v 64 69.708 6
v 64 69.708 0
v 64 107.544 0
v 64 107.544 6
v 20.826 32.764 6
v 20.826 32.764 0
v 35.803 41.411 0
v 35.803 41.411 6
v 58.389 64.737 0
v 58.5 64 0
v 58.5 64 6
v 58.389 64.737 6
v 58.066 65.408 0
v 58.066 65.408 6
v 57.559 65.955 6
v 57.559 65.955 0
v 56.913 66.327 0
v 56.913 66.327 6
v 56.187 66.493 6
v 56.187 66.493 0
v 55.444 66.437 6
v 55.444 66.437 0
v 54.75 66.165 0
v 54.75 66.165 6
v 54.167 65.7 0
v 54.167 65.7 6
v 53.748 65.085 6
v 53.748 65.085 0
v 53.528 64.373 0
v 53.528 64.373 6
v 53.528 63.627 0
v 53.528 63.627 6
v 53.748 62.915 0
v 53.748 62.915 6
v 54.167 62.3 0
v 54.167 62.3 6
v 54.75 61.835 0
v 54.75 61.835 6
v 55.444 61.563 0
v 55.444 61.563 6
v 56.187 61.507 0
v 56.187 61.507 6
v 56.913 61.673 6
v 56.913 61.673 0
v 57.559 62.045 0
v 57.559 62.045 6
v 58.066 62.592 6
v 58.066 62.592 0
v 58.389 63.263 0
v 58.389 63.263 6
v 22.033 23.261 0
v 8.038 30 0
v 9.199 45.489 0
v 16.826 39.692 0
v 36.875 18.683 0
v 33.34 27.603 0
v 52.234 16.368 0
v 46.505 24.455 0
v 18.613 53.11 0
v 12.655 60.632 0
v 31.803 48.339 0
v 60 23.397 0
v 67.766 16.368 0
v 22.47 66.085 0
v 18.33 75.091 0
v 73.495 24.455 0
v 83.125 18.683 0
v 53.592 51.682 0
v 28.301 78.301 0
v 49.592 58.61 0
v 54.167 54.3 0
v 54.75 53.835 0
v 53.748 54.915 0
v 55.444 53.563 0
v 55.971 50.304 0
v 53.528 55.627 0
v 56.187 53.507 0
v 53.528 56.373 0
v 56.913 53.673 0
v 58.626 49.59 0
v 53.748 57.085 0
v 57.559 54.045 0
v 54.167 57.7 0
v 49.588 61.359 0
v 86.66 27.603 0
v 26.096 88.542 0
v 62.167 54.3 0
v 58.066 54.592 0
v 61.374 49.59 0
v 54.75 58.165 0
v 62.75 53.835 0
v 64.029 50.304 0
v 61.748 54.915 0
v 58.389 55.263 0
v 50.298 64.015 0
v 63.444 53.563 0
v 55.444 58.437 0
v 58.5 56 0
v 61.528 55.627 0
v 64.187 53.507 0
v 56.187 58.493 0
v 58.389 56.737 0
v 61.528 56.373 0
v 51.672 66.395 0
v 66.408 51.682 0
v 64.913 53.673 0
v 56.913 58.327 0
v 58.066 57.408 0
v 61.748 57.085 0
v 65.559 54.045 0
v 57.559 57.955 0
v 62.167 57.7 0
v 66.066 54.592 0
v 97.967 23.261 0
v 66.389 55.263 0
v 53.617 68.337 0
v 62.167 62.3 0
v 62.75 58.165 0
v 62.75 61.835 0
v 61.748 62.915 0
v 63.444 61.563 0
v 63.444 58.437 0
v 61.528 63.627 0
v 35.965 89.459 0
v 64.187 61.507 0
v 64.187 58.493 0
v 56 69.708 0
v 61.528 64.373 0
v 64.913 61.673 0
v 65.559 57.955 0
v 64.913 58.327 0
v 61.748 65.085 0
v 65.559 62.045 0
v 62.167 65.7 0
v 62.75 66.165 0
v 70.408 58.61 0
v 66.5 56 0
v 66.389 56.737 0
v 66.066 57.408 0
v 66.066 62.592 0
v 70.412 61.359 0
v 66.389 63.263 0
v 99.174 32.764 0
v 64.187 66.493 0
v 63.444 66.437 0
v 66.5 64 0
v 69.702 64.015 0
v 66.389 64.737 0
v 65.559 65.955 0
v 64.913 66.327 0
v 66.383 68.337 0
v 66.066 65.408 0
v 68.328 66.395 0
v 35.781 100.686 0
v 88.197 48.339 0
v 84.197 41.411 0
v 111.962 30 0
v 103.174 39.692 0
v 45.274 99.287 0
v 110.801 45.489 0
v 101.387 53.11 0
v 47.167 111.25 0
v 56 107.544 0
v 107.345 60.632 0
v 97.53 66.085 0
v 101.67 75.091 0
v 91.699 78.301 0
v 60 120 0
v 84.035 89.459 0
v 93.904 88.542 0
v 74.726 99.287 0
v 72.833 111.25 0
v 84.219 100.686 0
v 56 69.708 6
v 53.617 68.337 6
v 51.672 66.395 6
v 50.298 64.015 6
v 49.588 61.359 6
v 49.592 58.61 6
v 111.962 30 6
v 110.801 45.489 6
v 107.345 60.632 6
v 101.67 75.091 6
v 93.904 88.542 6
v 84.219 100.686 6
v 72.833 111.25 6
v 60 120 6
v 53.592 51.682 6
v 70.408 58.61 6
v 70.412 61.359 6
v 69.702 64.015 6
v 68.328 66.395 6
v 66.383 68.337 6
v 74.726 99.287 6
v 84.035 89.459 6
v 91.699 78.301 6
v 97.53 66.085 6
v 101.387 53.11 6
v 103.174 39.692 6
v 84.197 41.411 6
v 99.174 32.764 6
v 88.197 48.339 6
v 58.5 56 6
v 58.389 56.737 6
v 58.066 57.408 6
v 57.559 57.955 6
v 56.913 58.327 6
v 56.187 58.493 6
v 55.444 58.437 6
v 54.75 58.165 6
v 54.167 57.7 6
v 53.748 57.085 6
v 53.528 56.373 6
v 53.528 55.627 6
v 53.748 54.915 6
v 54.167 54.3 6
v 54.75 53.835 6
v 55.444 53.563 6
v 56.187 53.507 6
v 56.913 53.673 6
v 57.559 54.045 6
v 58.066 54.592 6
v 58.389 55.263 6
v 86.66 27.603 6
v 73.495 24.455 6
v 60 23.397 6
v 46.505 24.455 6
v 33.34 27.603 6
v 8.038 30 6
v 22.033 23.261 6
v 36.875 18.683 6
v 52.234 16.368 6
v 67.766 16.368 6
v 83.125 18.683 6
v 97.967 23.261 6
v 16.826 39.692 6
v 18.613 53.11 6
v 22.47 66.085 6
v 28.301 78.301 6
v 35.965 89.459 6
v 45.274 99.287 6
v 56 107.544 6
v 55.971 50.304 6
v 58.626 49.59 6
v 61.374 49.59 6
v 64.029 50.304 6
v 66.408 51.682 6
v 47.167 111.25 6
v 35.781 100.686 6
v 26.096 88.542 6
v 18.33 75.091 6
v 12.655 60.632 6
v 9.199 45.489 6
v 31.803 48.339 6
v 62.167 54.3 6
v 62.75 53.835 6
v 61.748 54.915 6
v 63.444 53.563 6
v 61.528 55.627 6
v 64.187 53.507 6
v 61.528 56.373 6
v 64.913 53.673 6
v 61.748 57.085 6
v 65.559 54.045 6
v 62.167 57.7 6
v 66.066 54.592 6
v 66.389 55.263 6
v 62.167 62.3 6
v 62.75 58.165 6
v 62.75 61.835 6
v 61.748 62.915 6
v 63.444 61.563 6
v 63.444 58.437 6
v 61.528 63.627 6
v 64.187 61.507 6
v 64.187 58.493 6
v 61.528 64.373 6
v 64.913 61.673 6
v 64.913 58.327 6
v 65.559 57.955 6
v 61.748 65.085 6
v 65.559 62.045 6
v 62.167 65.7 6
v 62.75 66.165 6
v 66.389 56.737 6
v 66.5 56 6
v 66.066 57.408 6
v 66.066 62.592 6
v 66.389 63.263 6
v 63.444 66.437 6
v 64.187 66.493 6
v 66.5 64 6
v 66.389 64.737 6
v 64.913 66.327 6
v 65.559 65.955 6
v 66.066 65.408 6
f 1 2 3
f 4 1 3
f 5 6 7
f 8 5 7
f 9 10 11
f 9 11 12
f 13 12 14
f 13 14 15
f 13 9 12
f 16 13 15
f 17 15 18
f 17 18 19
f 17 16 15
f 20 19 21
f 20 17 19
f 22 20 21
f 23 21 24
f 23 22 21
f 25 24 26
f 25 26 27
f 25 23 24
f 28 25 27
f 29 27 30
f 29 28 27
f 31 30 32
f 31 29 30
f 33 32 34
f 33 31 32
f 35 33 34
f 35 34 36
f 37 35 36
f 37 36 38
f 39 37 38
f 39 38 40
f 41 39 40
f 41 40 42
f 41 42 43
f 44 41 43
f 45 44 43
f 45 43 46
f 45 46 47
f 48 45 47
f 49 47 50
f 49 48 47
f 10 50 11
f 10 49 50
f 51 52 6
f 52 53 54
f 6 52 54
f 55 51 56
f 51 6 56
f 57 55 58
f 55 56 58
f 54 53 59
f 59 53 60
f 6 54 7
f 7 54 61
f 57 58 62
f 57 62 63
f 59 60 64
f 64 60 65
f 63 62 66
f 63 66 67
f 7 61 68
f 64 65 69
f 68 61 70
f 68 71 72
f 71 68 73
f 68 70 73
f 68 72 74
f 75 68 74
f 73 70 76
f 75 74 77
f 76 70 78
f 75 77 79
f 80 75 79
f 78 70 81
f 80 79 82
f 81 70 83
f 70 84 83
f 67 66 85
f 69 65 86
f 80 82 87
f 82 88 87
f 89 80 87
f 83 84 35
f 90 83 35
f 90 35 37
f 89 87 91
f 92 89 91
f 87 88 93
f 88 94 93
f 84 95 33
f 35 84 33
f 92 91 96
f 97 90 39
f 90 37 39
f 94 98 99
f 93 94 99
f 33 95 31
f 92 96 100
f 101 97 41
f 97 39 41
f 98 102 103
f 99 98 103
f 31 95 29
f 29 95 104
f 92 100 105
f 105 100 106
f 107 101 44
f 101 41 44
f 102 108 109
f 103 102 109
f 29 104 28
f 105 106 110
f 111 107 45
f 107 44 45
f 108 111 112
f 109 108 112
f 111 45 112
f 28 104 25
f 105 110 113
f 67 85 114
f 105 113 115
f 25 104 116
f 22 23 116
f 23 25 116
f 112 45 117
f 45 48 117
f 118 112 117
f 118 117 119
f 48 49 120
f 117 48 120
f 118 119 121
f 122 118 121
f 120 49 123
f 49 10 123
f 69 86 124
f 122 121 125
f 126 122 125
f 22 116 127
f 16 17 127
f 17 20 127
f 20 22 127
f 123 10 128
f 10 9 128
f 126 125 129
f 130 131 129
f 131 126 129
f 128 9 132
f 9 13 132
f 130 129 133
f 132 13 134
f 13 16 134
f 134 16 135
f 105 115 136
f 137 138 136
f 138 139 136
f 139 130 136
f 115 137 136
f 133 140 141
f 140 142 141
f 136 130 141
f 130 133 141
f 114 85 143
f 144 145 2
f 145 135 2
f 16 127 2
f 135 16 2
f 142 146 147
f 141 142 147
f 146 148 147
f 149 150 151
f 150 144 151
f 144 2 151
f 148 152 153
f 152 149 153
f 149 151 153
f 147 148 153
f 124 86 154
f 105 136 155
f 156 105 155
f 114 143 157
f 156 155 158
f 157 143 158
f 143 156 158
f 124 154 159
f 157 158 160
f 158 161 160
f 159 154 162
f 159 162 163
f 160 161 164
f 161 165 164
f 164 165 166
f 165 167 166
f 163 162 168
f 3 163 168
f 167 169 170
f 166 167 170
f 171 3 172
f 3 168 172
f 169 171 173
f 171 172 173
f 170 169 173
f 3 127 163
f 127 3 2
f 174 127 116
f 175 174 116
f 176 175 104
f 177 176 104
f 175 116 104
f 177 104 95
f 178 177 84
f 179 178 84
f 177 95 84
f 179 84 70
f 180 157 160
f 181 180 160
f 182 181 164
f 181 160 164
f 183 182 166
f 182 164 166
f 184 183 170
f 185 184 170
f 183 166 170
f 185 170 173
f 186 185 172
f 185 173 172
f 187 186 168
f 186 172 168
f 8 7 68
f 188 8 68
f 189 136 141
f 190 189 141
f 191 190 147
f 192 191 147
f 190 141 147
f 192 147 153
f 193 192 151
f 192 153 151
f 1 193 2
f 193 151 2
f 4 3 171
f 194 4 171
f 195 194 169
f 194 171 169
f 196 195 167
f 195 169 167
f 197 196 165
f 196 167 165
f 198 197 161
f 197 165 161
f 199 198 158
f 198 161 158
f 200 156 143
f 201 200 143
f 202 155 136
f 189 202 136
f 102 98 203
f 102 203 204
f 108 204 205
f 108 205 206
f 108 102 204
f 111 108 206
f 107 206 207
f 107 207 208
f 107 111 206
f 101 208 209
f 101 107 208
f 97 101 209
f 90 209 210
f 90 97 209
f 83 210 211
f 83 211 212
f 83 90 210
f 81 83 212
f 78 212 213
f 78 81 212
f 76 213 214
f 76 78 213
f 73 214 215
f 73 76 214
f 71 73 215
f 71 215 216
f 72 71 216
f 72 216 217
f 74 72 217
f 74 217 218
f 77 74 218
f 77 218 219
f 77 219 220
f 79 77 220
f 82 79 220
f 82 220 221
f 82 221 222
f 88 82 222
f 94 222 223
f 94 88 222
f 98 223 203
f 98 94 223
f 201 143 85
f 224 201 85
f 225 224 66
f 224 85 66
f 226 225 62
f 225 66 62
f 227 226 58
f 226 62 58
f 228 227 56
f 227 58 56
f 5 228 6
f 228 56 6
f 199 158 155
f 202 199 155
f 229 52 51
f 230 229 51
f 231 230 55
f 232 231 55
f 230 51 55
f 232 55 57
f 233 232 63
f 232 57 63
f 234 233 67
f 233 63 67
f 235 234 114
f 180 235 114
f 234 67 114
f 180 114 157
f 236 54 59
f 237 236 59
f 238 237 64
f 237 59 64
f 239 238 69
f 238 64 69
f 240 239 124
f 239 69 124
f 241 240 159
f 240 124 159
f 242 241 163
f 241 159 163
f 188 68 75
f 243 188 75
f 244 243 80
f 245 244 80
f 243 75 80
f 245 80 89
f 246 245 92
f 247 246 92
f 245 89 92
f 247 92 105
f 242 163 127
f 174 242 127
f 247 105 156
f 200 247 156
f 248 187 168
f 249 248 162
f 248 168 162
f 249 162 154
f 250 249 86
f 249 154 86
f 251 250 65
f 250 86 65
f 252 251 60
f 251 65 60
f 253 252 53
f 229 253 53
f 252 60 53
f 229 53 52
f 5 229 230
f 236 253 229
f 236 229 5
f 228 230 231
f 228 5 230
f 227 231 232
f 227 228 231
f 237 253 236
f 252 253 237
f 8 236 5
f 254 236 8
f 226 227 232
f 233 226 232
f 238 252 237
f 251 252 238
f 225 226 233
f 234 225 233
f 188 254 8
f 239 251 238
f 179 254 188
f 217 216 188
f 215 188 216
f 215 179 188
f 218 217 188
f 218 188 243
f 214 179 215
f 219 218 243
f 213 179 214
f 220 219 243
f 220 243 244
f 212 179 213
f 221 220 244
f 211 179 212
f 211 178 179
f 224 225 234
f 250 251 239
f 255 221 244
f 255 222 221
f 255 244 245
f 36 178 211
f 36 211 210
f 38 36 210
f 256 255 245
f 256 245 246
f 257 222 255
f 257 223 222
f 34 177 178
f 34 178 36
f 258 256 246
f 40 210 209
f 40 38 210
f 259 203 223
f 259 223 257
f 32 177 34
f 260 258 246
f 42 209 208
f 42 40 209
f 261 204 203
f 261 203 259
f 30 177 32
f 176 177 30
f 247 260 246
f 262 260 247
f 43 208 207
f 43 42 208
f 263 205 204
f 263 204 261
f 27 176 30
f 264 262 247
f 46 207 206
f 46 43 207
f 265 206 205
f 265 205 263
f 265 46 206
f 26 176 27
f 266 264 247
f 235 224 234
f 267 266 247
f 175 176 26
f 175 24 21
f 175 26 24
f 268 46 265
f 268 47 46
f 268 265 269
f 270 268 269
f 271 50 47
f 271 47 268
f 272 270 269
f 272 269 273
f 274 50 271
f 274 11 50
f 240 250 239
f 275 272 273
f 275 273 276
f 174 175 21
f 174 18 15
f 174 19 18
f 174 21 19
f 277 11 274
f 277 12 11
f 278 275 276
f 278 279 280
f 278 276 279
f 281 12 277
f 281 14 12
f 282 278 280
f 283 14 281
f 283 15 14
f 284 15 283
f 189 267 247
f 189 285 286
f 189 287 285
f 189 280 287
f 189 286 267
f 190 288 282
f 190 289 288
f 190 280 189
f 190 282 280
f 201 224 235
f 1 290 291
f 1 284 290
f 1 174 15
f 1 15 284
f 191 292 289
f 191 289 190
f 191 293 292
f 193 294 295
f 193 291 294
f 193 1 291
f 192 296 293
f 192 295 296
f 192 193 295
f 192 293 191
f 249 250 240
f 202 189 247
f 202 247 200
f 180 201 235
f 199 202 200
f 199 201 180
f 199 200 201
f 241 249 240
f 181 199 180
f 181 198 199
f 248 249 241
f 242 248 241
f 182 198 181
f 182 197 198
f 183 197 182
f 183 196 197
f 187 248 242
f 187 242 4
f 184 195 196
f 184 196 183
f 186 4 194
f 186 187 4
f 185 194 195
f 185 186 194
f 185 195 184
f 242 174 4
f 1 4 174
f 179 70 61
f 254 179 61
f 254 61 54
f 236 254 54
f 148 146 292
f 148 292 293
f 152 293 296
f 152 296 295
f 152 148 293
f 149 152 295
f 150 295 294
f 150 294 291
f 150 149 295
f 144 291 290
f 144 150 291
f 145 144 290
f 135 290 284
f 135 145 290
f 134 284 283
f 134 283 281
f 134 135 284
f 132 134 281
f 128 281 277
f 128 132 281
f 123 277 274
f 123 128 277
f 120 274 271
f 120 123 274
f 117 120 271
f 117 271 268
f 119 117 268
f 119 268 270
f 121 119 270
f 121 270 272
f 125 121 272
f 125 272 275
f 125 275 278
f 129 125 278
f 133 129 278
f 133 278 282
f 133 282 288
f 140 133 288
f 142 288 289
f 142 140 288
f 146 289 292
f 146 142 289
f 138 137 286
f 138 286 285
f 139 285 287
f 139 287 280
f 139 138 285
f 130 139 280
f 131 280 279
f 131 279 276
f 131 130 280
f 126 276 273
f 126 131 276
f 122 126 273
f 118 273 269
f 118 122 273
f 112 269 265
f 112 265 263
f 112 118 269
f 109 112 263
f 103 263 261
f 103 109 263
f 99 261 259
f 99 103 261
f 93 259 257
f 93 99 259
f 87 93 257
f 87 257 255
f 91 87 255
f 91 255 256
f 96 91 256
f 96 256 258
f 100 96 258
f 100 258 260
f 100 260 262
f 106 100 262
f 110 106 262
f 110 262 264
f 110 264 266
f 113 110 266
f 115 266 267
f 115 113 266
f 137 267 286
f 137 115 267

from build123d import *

# Parameters (mm, degrees)
F0_R     = 2.5
F1_DEPTH = 6


with BuildPart() as f1:
    # F0 (on Top) → F1 (new body)
    with BuildSketch(Plane.XY):
        with BuildLine():
            ThreePointArc((60, 120), (21.961524, 81.961524), (8.038476, 30))
            ThreePointArc((8.038476, 30), (60, 16.076952), (111.961524, 30))
            ThreePointArc((111.961524, 30), (98.038476, 81.961524), (60, 120))
        make_face()
        with Locations((56, 56)):
            Circle(F0_R, mode=Mode.SUBTRACT)
        with Locations((56, 64)):
            Circle(F0_R, mode=Mode.SUBTRACT)
        with BuildLine():
            Line((35.802732, 41.410898), (53.592414, 51.681776))
            ThreePointArc((53.592414, 51.681776), (60, 49.5), (66.407586, 51.681776))
            Line((66.407586, 51.681776), (84.197268, 41.410898))
            Line((84.197268, 41.410898), (99.174061, 32.764043))
            ThreePointArc((99.174061, 32.764043), (60, 23.39746), (20.825939, 32.764043))
            Line((20.825939, 32.764043), (35.802732, 41.410898))
        make_face(mode=Mode.SUBTRACT)
        with Locations((64, 56)):
            Circle(F0_R, mode=Mode.SUBTRACT)
        with Locations((64, 64)):
            Circle(F0_R, mode=Mode.SUBTRACT)
        with BuildLine():
            ThreePointArc((16.825939, 39.692247), (28.30127, 78.30127), (56, 107.54371))
            Line((56, 107.54371), (56, 85))
            Line((56, 85), (56, 69.708244))
            ThreePointArc((56, 69.708244), (50.906733, 65.25), (49.592414, 58.60998))
            Line((49.592414, 58.60998), (31.802732, 48.339102))
            Line((31.802732, 48.339102), (16.825939, 39.692247))
        make_face(mode=Mode.SUBTRACT)
        with BuildLine():
            ThreePointArc((64, 107.54371), (91.69873, 78.30127), (103.174061, 39.692247))
            Line((103.174061, 39.692247), (88.197268, 48.339102))
            Line((88.197268, 48.339102), (70.407586, 58.60998))
            ThreePointArc((70.407586, 58.60998), (69.093267, 65.25), (64, 69.708244))
            Line((64, 69.708244), (64, 85))
            Line((64, 85), (64, 107.54371))
        make_face(mode=Mode.SUBTRACT)
    extrude(amount=F1_DEPTH)


solid = f1.part
